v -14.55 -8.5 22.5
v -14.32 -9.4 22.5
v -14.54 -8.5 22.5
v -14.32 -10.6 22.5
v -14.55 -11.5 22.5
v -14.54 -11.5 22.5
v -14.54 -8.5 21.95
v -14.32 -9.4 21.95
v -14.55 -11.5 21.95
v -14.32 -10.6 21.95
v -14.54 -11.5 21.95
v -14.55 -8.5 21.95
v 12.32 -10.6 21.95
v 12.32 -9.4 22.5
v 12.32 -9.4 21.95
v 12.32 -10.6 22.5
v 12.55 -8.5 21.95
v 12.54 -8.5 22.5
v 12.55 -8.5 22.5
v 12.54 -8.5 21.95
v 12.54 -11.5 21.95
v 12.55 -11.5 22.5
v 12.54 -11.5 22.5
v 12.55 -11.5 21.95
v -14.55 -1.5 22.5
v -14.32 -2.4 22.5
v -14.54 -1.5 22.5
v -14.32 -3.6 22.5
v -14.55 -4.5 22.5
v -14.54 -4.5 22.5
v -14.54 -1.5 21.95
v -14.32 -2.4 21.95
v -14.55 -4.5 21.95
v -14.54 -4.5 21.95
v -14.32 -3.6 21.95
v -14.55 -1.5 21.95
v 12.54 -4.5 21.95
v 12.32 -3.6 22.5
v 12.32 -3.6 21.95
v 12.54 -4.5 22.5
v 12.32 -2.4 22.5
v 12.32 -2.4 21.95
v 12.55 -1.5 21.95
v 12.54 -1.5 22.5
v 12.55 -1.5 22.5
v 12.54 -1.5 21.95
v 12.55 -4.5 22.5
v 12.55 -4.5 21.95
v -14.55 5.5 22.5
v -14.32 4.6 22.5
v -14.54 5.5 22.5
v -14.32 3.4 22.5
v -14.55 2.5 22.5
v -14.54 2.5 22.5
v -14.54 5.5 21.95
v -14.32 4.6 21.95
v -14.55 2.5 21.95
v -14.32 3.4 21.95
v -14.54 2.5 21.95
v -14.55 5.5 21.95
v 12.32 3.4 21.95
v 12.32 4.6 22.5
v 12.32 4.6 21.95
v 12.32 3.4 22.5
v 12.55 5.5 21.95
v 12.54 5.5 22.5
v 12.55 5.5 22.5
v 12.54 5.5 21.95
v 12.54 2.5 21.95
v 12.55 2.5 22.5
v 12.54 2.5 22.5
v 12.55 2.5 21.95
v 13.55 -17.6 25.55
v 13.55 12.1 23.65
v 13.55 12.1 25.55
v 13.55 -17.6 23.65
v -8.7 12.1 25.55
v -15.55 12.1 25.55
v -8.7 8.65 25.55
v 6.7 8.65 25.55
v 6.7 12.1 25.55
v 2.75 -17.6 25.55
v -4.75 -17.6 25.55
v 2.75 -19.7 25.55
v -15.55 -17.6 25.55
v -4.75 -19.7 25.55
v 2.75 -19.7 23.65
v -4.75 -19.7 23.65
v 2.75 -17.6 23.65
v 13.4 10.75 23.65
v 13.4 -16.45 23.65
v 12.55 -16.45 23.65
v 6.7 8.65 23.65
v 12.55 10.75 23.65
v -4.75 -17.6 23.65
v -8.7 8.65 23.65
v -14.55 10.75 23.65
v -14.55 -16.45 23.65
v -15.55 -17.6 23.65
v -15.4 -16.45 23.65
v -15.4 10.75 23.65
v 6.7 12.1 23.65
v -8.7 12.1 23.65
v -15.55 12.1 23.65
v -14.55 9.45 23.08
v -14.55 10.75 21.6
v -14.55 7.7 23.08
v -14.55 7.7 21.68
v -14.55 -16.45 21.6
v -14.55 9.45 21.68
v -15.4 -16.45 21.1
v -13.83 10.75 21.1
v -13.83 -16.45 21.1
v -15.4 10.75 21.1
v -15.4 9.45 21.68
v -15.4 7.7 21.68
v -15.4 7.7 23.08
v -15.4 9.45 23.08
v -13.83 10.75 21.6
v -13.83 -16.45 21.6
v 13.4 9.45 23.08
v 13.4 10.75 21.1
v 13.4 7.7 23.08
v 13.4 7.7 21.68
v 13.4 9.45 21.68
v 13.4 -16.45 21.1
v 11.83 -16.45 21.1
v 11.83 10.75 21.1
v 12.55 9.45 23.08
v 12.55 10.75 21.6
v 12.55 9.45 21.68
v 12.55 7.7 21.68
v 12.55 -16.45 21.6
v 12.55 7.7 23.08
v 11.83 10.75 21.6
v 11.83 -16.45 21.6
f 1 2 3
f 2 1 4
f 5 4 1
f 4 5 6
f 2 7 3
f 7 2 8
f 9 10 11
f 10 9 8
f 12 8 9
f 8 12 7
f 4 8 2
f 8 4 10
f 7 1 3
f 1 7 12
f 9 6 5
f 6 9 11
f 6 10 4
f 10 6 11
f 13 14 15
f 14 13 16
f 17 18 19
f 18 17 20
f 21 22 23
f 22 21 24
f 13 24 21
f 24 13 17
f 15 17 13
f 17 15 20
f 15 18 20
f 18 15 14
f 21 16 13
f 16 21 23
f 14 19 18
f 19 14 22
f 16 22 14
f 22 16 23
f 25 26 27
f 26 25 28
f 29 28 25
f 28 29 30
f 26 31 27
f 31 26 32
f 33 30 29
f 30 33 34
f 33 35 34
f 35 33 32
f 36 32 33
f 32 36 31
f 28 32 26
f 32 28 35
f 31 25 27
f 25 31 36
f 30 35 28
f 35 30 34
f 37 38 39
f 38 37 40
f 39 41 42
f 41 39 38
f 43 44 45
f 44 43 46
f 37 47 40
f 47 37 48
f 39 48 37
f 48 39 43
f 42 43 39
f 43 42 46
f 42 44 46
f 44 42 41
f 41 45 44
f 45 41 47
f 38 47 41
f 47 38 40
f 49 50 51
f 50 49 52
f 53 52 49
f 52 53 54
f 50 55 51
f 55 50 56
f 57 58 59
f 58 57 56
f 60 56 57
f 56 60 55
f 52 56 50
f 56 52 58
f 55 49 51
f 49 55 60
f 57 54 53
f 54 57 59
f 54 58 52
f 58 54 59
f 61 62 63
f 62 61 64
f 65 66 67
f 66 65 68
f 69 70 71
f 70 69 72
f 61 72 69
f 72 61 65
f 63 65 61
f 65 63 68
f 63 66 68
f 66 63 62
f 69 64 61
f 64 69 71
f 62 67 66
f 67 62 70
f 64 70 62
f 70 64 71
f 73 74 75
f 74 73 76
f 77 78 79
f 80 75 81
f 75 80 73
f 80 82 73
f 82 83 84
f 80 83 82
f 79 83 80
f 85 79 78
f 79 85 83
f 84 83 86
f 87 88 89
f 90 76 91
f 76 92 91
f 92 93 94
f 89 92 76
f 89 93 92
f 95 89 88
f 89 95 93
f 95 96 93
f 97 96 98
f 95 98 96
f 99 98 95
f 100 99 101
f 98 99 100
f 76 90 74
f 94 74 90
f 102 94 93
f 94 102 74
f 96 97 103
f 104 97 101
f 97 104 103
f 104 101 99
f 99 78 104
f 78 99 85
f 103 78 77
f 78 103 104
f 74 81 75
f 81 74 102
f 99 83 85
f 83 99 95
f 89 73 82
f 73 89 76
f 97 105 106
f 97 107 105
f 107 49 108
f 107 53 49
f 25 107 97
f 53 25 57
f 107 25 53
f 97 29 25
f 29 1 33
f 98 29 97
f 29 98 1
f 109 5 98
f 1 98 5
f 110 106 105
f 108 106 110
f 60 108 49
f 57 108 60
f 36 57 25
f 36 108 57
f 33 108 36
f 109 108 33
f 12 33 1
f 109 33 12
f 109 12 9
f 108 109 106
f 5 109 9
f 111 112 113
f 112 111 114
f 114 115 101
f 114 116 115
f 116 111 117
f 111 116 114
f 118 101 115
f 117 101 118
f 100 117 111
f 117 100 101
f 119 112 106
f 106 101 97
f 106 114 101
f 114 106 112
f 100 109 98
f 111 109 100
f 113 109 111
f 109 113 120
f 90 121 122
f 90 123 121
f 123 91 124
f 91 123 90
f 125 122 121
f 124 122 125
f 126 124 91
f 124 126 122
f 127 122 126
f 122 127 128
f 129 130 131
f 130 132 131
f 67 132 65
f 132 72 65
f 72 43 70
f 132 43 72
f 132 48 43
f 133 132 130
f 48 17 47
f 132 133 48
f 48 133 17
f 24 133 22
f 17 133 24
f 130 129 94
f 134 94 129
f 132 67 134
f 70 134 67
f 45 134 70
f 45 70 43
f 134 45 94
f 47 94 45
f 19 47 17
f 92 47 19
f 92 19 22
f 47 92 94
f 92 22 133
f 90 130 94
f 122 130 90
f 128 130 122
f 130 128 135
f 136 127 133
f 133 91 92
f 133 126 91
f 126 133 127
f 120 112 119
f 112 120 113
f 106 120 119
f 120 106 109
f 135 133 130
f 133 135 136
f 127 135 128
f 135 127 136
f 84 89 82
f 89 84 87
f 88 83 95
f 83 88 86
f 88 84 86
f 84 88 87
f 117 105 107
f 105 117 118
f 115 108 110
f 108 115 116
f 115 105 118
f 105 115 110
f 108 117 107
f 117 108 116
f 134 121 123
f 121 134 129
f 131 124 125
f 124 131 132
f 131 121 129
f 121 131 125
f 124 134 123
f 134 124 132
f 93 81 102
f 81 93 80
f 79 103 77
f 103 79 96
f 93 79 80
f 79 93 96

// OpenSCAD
// V32 lid: slightly closer sliding fit, with local friction pads.
// USB access and snap-detent reliefs are preserved; neither is a locking-key hole.
part="lid";
side_inset=.15;
roof_drop=.10;
pad_projection=.23; // nominal rail-side clearance .20 => .03 mm local preload
module friction_pad(left=true,y=0){
    inner=left ? -14.7+side_inset : 12.7-side_inset;
    hull(){
        translate([left?inner-.04:inner-.01,y-1.5,21.95])cube([.05,3,.55]);
        translate([left?inner-.01:inner-pad_projection,y-.6,21.95])cube([pad_projection+.01,1.2,.55]);
    }
}
module lid(){
    difference(){
        union(){
            translate([-15.55,-17.60,23.75-roof_drop])cube([29.10,29.70,1.90]);
            translate([-15.55+side_inset,-16.45,21.10])cube([.85,27.2,2.65-roof_drop]);
            translate([12.70-side_inset,-16.45,21.10])cube([.85,27.2,2.65-roof_drop]);
            translate([-14.70+side_inset,-16.45,21.10])cube([.72,27.2,.50]);
            translate([11.98-side_inset,-16.45,21.10])cube([.72,27.2,.50]);
            translate([-4.75,-19.70,23.75-roof_drop])cube([7.5,2.3,1.90]);
            for(y=[-10,-3,4]){friction_pad(true,y);friction_pad(false,y);}
        }
        // Existing snap-detent reliefs, not locking-key holes.
        translate([-15.7,7.70,21.68])cube([1.40,1.75,1.40]);
        translate([12.35,7.70,21.68])cube([1.40,1.75,1.40]);
        translate([-8.7,8.65,23.20])cube([15.4,5.10,3.20]);
    }
}

module channel(){
 hull(){translate([-7.58,-20,2.24])cube([15.16,40,.16]);translate([-5.65,-20,4.9])cube([11.3,40,.16]);}
 translate([-5.65,-20,4.9])cube([11.3,40,5]);
}
module slot_fill(){difference(){translate([-10.25,10.75,2.08])cube([20.5,2.35,2.2]);channel();}}
module receiver(){union(){import("../printable/G7_Modular_v31_universal_receiver.stl",convexity=12);slot_fill();}}
if(part=="lid")lid();
else if(part=="universal_receiver")receiver();
else if(part=="slot_fill")slot_fill();
else if(part=="g7_mount")assert(false,"Build the mounted patch with tools/build_v32.py");
else import(str("../printable/G7_Modular_v31_",part,".stl"),convexity=20);
